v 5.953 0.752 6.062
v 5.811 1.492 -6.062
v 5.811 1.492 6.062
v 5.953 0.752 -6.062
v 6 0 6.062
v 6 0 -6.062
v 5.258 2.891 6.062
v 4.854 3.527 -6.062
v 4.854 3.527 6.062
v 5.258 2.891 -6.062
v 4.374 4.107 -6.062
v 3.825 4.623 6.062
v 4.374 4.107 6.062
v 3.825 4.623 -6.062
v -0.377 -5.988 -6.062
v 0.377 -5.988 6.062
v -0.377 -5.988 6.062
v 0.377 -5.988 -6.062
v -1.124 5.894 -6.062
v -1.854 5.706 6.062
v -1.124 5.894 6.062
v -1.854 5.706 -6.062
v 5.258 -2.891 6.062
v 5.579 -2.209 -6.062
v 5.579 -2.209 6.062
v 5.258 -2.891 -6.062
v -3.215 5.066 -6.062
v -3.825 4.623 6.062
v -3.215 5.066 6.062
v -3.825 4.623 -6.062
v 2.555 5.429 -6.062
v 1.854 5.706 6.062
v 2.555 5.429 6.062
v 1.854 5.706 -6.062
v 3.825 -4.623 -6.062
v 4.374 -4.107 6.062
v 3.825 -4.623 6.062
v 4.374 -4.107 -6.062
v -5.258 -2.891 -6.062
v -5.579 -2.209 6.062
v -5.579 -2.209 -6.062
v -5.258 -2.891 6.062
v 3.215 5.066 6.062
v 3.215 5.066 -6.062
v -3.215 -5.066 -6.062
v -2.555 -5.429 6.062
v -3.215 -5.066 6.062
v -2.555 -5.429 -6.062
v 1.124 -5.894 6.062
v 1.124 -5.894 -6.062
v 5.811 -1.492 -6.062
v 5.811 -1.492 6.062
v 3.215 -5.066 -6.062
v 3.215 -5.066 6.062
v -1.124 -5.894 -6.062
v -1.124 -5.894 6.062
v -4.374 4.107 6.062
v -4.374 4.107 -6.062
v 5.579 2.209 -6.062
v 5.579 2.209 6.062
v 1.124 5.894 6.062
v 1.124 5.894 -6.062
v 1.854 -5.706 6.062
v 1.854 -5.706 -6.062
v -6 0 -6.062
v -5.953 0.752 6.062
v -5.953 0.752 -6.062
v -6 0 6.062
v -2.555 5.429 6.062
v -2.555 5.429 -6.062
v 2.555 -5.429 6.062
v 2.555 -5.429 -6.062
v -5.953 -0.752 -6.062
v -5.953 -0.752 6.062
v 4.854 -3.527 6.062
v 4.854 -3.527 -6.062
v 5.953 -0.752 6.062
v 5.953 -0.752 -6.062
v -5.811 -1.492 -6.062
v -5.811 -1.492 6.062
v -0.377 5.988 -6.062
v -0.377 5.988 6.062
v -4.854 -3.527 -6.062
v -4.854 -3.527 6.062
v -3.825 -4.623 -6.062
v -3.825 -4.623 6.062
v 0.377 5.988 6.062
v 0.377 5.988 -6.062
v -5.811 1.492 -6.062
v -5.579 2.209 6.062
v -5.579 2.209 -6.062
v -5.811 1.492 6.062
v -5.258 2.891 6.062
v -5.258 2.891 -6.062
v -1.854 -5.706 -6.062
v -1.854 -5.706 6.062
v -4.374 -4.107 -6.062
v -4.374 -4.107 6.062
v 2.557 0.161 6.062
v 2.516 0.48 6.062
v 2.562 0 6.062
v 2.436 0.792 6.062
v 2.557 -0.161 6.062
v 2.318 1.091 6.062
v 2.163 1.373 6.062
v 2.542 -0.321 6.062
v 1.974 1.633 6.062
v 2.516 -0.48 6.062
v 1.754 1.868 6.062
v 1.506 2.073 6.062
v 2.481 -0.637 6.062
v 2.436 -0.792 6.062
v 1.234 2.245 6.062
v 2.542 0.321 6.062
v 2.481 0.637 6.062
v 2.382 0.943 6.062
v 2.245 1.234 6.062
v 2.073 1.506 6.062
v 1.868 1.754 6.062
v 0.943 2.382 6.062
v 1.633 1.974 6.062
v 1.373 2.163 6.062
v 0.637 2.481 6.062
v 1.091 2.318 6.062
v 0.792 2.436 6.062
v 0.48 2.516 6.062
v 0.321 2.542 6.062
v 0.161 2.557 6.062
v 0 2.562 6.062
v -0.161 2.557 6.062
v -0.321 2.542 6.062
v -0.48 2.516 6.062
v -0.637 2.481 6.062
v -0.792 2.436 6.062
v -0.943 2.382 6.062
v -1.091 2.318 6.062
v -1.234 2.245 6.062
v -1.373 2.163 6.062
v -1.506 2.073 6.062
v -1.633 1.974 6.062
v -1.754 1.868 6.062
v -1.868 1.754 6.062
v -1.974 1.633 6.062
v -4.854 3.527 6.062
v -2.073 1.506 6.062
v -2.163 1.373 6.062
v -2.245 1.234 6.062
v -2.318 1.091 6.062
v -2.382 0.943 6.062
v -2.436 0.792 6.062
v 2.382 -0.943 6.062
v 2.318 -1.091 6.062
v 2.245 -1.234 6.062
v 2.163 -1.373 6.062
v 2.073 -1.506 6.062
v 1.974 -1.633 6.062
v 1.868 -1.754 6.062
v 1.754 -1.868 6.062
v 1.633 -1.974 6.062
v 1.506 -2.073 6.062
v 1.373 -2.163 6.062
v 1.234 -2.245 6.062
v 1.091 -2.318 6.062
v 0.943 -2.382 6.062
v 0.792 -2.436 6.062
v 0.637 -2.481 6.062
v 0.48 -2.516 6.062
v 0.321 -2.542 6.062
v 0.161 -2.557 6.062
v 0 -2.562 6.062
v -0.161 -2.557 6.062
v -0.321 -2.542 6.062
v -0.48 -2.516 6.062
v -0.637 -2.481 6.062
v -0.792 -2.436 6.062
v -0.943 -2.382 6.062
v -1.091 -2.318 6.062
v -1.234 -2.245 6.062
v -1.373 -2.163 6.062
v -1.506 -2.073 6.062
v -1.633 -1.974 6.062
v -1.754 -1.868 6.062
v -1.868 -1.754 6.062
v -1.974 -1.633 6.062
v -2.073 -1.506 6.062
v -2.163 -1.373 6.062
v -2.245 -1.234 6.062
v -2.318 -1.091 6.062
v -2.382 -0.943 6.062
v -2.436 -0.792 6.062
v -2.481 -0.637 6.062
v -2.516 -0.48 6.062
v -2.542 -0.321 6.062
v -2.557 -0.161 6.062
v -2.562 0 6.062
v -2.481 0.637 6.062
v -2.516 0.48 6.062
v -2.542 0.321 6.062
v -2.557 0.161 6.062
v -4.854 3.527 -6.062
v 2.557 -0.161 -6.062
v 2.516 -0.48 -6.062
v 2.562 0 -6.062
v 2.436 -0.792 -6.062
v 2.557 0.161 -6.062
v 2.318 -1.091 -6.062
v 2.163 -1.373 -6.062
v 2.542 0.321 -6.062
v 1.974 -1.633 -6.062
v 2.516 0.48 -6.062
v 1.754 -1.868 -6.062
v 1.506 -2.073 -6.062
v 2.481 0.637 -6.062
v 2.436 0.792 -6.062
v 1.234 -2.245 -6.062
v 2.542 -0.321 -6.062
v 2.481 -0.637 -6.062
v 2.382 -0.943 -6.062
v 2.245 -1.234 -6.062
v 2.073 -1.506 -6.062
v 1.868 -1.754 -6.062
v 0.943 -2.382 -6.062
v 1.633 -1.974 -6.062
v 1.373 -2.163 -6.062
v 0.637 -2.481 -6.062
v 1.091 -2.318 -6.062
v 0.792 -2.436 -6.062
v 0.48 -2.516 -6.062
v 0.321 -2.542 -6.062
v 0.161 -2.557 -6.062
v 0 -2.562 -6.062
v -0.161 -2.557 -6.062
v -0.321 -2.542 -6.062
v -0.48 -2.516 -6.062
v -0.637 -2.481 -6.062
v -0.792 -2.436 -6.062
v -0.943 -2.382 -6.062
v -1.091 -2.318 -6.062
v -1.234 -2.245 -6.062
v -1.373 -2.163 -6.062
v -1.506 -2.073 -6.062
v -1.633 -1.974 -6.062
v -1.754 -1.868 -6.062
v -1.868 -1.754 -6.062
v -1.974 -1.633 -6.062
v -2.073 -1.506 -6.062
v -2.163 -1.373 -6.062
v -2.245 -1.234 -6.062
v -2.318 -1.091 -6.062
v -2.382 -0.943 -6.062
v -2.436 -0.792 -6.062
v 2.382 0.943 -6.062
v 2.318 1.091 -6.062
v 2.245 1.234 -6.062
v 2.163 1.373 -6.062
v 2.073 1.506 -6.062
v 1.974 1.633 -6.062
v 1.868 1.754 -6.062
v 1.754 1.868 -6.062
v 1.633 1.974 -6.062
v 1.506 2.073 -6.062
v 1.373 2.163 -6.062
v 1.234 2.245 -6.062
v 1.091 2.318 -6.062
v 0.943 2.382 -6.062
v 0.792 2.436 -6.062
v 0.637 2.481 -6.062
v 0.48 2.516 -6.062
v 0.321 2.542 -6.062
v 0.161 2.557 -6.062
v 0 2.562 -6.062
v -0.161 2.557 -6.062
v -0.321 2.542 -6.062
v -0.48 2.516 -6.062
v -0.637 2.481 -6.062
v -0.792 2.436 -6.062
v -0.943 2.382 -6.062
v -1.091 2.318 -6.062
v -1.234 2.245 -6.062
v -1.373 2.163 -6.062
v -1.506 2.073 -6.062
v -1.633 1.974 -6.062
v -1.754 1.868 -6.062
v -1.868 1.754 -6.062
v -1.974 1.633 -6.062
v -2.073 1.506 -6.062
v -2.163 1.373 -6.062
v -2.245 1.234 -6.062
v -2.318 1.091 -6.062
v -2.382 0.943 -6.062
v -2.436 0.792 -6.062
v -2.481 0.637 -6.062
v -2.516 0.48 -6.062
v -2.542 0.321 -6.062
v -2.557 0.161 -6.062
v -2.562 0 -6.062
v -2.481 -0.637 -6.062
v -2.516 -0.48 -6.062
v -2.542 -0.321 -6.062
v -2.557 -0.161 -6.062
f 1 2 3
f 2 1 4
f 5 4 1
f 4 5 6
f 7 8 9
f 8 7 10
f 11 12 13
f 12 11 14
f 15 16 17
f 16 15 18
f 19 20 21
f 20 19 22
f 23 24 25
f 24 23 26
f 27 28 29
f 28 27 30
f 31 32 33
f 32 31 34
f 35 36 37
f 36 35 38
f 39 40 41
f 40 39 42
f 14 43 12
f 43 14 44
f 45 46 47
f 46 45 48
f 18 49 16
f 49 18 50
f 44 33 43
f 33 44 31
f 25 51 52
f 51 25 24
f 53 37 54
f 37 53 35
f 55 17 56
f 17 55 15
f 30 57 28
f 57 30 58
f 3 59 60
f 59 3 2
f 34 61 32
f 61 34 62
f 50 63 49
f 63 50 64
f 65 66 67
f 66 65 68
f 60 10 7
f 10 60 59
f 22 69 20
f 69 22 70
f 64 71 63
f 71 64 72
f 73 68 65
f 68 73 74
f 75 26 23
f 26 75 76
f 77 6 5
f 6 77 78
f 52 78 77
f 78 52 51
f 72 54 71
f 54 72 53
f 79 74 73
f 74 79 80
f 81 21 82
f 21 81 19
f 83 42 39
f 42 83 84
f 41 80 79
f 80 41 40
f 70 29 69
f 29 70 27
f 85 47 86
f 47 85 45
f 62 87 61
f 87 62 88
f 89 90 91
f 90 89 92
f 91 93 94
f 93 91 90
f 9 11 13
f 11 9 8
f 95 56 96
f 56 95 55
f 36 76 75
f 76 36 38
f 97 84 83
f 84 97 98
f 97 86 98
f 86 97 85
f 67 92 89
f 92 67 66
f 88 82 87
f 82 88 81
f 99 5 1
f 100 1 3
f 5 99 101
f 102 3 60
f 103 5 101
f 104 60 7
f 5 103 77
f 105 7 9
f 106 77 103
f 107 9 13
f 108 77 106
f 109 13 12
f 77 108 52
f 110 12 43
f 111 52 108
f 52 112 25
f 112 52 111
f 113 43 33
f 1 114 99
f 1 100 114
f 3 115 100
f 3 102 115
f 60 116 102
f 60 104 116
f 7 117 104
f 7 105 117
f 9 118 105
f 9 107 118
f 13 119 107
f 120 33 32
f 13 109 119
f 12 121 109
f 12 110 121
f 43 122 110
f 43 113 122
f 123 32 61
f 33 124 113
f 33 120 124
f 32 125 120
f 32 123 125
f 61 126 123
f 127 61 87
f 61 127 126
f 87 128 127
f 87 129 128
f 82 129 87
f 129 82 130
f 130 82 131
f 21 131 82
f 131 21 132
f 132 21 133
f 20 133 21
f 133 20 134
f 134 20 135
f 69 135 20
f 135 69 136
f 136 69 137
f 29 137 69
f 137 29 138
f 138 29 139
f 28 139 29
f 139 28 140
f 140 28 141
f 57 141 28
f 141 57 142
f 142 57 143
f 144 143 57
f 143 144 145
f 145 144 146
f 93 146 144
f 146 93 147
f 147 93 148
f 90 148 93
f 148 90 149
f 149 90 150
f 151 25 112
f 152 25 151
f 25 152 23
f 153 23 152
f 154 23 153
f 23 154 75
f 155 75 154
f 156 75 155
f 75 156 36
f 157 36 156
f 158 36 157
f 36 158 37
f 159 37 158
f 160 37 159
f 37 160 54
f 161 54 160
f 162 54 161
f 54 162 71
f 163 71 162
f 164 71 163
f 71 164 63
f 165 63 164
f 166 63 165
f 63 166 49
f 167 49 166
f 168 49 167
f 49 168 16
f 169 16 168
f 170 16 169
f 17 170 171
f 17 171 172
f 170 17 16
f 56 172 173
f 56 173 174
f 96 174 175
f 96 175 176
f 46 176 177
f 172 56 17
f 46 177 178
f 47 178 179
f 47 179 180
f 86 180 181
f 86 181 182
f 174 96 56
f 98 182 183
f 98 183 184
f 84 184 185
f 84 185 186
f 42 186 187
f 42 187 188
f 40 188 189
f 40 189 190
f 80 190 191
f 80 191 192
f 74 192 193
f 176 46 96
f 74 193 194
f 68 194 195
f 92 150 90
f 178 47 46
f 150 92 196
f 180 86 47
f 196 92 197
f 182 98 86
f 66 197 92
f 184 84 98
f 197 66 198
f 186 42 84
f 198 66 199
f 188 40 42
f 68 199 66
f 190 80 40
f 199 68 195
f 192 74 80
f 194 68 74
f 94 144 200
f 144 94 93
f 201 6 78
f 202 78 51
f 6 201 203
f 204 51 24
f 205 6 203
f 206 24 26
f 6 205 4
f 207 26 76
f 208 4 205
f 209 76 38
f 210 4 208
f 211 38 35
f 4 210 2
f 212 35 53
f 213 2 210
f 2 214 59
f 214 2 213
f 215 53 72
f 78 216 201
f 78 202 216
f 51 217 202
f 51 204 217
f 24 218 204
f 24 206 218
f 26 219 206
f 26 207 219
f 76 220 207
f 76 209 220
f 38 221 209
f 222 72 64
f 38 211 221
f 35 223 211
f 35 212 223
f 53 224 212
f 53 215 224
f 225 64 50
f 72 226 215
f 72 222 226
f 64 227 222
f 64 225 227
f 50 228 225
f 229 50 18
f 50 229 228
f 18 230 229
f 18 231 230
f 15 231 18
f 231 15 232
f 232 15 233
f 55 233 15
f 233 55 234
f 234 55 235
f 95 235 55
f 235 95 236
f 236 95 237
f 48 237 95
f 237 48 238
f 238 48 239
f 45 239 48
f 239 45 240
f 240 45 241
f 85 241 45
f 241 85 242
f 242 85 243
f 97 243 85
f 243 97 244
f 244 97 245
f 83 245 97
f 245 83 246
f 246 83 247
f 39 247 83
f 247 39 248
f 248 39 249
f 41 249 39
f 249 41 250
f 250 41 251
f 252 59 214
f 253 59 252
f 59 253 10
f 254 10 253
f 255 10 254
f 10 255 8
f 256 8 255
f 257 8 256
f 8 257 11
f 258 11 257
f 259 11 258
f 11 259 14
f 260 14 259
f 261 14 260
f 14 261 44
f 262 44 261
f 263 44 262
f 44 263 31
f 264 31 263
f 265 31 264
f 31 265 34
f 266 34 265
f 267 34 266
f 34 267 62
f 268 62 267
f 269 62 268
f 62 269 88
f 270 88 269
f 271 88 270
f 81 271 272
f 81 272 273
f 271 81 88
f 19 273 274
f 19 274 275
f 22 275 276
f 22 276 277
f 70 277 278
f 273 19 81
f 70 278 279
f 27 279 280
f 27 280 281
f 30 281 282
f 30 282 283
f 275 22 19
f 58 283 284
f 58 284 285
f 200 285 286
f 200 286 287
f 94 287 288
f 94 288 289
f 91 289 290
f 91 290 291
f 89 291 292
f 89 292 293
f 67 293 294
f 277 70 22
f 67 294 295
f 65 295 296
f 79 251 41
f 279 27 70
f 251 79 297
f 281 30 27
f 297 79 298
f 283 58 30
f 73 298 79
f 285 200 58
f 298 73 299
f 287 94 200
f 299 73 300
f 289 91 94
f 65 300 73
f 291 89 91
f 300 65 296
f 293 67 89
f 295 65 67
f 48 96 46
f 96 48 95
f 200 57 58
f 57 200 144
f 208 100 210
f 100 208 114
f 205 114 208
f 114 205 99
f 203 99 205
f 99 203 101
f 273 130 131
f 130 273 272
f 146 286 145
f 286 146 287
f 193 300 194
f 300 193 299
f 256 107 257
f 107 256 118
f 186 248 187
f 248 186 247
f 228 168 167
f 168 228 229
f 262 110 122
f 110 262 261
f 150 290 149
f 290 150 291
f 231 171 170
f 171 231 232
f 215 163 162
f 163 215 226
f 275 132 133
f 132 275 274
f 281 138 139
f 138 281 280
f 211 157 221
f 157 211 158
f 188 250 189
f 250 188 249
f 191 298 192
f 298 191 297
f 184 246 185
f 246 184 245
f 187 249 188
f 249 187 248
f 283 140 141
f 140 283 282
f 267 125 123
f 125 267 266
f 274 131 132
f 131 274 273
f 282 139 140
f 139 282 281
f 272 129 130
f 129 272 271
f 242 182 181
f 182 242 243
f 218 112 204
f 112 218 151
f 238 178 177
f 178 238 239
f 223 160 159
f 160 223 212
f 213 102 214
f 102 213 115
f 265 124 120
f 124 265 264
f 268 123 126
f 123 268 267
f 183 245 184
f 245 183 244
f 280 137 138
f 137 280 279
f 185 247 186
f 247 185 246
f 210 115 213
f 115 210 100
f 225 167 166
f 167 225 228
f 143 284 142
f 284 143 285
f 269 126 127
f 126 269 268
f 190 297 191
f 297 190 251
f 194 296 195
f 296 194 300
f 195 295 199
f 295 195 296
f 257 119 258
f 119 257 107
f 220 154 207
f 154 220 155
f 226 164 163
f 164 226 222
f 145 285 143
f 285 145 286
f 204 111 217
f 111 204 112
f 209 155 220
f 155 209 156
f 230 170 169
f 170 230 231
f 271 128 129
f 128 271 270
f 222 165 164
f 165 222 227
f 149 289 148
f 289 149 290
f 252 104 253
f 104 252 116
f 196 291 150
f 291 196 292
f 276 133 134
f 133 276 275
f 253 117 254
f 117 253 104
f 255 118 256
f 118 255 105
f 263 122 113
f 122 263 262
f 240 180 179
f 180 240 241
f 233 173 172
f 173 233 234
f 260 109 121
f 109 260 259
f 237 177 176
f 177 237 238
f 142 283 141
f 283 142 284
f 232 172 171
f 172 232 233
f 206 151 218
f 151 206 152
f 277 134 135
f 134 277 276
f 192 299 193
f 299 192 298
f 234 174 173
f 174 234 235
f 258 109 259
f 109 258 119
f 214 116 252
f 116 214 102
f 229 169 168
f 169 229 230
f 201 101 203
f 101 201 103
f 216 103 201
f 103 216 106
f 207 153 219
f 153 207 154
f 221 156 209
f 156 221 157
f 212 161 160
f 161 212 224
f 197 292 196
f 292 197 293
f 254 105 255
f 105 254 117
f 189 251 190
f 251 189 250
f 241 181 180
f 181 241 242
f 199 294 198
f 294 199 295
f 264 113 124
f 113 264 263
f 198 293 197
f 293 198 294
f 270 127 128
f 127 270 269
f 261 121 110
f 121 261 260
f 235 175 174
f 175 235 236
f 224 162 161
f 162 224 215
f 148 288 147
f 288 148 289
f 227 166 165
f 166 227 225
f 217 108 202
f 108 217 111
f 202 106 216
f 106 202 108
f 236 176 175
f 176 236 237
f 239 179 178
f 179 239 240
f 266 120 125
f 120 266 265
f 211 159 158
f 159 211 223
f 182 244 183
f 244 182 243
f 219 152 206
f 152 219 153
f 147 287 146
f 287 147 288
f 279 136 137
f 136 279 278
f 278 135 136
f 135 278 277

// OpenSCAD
// This is a custom powder bushing the Lee AutoDisk Powder Measure Disk.
// It features customizable powder drop volumes in cc.
//
// Warning -- some sanding and fitting may be required.
//
// This is licensed under the creative commons+attribution license
//
// To fulfil the attribution requirement, please link to:
// http://www.thingiverse.com/thing:2176431
//
// As of 14 April 2017

/* [Main] */

// in mm
bushing_height=12.125; //[6:0.05:12.5]

// in mm
bushing_diameter=12.0; //[6:0.05:12.5]

// of hole in cc
volume=0.25; //[0.1:0.05:0.6]

// Number of sides on face of inner hole (higer number=smoother)
sides=100;

module body()
{
	difference()
	{
		cylinder(h=bushing_height,r=bushing_diameter/2,center=true,$fn=50);
		// To solve for radius given volume in cc, multiply cc by 1000 to get cubic mm
		#cylinder(h=bushing_height+1,r=sqrt((volume*1000)/(3.14159*bushing_height)),center=true,$fn=sides);
	}
}

body();
